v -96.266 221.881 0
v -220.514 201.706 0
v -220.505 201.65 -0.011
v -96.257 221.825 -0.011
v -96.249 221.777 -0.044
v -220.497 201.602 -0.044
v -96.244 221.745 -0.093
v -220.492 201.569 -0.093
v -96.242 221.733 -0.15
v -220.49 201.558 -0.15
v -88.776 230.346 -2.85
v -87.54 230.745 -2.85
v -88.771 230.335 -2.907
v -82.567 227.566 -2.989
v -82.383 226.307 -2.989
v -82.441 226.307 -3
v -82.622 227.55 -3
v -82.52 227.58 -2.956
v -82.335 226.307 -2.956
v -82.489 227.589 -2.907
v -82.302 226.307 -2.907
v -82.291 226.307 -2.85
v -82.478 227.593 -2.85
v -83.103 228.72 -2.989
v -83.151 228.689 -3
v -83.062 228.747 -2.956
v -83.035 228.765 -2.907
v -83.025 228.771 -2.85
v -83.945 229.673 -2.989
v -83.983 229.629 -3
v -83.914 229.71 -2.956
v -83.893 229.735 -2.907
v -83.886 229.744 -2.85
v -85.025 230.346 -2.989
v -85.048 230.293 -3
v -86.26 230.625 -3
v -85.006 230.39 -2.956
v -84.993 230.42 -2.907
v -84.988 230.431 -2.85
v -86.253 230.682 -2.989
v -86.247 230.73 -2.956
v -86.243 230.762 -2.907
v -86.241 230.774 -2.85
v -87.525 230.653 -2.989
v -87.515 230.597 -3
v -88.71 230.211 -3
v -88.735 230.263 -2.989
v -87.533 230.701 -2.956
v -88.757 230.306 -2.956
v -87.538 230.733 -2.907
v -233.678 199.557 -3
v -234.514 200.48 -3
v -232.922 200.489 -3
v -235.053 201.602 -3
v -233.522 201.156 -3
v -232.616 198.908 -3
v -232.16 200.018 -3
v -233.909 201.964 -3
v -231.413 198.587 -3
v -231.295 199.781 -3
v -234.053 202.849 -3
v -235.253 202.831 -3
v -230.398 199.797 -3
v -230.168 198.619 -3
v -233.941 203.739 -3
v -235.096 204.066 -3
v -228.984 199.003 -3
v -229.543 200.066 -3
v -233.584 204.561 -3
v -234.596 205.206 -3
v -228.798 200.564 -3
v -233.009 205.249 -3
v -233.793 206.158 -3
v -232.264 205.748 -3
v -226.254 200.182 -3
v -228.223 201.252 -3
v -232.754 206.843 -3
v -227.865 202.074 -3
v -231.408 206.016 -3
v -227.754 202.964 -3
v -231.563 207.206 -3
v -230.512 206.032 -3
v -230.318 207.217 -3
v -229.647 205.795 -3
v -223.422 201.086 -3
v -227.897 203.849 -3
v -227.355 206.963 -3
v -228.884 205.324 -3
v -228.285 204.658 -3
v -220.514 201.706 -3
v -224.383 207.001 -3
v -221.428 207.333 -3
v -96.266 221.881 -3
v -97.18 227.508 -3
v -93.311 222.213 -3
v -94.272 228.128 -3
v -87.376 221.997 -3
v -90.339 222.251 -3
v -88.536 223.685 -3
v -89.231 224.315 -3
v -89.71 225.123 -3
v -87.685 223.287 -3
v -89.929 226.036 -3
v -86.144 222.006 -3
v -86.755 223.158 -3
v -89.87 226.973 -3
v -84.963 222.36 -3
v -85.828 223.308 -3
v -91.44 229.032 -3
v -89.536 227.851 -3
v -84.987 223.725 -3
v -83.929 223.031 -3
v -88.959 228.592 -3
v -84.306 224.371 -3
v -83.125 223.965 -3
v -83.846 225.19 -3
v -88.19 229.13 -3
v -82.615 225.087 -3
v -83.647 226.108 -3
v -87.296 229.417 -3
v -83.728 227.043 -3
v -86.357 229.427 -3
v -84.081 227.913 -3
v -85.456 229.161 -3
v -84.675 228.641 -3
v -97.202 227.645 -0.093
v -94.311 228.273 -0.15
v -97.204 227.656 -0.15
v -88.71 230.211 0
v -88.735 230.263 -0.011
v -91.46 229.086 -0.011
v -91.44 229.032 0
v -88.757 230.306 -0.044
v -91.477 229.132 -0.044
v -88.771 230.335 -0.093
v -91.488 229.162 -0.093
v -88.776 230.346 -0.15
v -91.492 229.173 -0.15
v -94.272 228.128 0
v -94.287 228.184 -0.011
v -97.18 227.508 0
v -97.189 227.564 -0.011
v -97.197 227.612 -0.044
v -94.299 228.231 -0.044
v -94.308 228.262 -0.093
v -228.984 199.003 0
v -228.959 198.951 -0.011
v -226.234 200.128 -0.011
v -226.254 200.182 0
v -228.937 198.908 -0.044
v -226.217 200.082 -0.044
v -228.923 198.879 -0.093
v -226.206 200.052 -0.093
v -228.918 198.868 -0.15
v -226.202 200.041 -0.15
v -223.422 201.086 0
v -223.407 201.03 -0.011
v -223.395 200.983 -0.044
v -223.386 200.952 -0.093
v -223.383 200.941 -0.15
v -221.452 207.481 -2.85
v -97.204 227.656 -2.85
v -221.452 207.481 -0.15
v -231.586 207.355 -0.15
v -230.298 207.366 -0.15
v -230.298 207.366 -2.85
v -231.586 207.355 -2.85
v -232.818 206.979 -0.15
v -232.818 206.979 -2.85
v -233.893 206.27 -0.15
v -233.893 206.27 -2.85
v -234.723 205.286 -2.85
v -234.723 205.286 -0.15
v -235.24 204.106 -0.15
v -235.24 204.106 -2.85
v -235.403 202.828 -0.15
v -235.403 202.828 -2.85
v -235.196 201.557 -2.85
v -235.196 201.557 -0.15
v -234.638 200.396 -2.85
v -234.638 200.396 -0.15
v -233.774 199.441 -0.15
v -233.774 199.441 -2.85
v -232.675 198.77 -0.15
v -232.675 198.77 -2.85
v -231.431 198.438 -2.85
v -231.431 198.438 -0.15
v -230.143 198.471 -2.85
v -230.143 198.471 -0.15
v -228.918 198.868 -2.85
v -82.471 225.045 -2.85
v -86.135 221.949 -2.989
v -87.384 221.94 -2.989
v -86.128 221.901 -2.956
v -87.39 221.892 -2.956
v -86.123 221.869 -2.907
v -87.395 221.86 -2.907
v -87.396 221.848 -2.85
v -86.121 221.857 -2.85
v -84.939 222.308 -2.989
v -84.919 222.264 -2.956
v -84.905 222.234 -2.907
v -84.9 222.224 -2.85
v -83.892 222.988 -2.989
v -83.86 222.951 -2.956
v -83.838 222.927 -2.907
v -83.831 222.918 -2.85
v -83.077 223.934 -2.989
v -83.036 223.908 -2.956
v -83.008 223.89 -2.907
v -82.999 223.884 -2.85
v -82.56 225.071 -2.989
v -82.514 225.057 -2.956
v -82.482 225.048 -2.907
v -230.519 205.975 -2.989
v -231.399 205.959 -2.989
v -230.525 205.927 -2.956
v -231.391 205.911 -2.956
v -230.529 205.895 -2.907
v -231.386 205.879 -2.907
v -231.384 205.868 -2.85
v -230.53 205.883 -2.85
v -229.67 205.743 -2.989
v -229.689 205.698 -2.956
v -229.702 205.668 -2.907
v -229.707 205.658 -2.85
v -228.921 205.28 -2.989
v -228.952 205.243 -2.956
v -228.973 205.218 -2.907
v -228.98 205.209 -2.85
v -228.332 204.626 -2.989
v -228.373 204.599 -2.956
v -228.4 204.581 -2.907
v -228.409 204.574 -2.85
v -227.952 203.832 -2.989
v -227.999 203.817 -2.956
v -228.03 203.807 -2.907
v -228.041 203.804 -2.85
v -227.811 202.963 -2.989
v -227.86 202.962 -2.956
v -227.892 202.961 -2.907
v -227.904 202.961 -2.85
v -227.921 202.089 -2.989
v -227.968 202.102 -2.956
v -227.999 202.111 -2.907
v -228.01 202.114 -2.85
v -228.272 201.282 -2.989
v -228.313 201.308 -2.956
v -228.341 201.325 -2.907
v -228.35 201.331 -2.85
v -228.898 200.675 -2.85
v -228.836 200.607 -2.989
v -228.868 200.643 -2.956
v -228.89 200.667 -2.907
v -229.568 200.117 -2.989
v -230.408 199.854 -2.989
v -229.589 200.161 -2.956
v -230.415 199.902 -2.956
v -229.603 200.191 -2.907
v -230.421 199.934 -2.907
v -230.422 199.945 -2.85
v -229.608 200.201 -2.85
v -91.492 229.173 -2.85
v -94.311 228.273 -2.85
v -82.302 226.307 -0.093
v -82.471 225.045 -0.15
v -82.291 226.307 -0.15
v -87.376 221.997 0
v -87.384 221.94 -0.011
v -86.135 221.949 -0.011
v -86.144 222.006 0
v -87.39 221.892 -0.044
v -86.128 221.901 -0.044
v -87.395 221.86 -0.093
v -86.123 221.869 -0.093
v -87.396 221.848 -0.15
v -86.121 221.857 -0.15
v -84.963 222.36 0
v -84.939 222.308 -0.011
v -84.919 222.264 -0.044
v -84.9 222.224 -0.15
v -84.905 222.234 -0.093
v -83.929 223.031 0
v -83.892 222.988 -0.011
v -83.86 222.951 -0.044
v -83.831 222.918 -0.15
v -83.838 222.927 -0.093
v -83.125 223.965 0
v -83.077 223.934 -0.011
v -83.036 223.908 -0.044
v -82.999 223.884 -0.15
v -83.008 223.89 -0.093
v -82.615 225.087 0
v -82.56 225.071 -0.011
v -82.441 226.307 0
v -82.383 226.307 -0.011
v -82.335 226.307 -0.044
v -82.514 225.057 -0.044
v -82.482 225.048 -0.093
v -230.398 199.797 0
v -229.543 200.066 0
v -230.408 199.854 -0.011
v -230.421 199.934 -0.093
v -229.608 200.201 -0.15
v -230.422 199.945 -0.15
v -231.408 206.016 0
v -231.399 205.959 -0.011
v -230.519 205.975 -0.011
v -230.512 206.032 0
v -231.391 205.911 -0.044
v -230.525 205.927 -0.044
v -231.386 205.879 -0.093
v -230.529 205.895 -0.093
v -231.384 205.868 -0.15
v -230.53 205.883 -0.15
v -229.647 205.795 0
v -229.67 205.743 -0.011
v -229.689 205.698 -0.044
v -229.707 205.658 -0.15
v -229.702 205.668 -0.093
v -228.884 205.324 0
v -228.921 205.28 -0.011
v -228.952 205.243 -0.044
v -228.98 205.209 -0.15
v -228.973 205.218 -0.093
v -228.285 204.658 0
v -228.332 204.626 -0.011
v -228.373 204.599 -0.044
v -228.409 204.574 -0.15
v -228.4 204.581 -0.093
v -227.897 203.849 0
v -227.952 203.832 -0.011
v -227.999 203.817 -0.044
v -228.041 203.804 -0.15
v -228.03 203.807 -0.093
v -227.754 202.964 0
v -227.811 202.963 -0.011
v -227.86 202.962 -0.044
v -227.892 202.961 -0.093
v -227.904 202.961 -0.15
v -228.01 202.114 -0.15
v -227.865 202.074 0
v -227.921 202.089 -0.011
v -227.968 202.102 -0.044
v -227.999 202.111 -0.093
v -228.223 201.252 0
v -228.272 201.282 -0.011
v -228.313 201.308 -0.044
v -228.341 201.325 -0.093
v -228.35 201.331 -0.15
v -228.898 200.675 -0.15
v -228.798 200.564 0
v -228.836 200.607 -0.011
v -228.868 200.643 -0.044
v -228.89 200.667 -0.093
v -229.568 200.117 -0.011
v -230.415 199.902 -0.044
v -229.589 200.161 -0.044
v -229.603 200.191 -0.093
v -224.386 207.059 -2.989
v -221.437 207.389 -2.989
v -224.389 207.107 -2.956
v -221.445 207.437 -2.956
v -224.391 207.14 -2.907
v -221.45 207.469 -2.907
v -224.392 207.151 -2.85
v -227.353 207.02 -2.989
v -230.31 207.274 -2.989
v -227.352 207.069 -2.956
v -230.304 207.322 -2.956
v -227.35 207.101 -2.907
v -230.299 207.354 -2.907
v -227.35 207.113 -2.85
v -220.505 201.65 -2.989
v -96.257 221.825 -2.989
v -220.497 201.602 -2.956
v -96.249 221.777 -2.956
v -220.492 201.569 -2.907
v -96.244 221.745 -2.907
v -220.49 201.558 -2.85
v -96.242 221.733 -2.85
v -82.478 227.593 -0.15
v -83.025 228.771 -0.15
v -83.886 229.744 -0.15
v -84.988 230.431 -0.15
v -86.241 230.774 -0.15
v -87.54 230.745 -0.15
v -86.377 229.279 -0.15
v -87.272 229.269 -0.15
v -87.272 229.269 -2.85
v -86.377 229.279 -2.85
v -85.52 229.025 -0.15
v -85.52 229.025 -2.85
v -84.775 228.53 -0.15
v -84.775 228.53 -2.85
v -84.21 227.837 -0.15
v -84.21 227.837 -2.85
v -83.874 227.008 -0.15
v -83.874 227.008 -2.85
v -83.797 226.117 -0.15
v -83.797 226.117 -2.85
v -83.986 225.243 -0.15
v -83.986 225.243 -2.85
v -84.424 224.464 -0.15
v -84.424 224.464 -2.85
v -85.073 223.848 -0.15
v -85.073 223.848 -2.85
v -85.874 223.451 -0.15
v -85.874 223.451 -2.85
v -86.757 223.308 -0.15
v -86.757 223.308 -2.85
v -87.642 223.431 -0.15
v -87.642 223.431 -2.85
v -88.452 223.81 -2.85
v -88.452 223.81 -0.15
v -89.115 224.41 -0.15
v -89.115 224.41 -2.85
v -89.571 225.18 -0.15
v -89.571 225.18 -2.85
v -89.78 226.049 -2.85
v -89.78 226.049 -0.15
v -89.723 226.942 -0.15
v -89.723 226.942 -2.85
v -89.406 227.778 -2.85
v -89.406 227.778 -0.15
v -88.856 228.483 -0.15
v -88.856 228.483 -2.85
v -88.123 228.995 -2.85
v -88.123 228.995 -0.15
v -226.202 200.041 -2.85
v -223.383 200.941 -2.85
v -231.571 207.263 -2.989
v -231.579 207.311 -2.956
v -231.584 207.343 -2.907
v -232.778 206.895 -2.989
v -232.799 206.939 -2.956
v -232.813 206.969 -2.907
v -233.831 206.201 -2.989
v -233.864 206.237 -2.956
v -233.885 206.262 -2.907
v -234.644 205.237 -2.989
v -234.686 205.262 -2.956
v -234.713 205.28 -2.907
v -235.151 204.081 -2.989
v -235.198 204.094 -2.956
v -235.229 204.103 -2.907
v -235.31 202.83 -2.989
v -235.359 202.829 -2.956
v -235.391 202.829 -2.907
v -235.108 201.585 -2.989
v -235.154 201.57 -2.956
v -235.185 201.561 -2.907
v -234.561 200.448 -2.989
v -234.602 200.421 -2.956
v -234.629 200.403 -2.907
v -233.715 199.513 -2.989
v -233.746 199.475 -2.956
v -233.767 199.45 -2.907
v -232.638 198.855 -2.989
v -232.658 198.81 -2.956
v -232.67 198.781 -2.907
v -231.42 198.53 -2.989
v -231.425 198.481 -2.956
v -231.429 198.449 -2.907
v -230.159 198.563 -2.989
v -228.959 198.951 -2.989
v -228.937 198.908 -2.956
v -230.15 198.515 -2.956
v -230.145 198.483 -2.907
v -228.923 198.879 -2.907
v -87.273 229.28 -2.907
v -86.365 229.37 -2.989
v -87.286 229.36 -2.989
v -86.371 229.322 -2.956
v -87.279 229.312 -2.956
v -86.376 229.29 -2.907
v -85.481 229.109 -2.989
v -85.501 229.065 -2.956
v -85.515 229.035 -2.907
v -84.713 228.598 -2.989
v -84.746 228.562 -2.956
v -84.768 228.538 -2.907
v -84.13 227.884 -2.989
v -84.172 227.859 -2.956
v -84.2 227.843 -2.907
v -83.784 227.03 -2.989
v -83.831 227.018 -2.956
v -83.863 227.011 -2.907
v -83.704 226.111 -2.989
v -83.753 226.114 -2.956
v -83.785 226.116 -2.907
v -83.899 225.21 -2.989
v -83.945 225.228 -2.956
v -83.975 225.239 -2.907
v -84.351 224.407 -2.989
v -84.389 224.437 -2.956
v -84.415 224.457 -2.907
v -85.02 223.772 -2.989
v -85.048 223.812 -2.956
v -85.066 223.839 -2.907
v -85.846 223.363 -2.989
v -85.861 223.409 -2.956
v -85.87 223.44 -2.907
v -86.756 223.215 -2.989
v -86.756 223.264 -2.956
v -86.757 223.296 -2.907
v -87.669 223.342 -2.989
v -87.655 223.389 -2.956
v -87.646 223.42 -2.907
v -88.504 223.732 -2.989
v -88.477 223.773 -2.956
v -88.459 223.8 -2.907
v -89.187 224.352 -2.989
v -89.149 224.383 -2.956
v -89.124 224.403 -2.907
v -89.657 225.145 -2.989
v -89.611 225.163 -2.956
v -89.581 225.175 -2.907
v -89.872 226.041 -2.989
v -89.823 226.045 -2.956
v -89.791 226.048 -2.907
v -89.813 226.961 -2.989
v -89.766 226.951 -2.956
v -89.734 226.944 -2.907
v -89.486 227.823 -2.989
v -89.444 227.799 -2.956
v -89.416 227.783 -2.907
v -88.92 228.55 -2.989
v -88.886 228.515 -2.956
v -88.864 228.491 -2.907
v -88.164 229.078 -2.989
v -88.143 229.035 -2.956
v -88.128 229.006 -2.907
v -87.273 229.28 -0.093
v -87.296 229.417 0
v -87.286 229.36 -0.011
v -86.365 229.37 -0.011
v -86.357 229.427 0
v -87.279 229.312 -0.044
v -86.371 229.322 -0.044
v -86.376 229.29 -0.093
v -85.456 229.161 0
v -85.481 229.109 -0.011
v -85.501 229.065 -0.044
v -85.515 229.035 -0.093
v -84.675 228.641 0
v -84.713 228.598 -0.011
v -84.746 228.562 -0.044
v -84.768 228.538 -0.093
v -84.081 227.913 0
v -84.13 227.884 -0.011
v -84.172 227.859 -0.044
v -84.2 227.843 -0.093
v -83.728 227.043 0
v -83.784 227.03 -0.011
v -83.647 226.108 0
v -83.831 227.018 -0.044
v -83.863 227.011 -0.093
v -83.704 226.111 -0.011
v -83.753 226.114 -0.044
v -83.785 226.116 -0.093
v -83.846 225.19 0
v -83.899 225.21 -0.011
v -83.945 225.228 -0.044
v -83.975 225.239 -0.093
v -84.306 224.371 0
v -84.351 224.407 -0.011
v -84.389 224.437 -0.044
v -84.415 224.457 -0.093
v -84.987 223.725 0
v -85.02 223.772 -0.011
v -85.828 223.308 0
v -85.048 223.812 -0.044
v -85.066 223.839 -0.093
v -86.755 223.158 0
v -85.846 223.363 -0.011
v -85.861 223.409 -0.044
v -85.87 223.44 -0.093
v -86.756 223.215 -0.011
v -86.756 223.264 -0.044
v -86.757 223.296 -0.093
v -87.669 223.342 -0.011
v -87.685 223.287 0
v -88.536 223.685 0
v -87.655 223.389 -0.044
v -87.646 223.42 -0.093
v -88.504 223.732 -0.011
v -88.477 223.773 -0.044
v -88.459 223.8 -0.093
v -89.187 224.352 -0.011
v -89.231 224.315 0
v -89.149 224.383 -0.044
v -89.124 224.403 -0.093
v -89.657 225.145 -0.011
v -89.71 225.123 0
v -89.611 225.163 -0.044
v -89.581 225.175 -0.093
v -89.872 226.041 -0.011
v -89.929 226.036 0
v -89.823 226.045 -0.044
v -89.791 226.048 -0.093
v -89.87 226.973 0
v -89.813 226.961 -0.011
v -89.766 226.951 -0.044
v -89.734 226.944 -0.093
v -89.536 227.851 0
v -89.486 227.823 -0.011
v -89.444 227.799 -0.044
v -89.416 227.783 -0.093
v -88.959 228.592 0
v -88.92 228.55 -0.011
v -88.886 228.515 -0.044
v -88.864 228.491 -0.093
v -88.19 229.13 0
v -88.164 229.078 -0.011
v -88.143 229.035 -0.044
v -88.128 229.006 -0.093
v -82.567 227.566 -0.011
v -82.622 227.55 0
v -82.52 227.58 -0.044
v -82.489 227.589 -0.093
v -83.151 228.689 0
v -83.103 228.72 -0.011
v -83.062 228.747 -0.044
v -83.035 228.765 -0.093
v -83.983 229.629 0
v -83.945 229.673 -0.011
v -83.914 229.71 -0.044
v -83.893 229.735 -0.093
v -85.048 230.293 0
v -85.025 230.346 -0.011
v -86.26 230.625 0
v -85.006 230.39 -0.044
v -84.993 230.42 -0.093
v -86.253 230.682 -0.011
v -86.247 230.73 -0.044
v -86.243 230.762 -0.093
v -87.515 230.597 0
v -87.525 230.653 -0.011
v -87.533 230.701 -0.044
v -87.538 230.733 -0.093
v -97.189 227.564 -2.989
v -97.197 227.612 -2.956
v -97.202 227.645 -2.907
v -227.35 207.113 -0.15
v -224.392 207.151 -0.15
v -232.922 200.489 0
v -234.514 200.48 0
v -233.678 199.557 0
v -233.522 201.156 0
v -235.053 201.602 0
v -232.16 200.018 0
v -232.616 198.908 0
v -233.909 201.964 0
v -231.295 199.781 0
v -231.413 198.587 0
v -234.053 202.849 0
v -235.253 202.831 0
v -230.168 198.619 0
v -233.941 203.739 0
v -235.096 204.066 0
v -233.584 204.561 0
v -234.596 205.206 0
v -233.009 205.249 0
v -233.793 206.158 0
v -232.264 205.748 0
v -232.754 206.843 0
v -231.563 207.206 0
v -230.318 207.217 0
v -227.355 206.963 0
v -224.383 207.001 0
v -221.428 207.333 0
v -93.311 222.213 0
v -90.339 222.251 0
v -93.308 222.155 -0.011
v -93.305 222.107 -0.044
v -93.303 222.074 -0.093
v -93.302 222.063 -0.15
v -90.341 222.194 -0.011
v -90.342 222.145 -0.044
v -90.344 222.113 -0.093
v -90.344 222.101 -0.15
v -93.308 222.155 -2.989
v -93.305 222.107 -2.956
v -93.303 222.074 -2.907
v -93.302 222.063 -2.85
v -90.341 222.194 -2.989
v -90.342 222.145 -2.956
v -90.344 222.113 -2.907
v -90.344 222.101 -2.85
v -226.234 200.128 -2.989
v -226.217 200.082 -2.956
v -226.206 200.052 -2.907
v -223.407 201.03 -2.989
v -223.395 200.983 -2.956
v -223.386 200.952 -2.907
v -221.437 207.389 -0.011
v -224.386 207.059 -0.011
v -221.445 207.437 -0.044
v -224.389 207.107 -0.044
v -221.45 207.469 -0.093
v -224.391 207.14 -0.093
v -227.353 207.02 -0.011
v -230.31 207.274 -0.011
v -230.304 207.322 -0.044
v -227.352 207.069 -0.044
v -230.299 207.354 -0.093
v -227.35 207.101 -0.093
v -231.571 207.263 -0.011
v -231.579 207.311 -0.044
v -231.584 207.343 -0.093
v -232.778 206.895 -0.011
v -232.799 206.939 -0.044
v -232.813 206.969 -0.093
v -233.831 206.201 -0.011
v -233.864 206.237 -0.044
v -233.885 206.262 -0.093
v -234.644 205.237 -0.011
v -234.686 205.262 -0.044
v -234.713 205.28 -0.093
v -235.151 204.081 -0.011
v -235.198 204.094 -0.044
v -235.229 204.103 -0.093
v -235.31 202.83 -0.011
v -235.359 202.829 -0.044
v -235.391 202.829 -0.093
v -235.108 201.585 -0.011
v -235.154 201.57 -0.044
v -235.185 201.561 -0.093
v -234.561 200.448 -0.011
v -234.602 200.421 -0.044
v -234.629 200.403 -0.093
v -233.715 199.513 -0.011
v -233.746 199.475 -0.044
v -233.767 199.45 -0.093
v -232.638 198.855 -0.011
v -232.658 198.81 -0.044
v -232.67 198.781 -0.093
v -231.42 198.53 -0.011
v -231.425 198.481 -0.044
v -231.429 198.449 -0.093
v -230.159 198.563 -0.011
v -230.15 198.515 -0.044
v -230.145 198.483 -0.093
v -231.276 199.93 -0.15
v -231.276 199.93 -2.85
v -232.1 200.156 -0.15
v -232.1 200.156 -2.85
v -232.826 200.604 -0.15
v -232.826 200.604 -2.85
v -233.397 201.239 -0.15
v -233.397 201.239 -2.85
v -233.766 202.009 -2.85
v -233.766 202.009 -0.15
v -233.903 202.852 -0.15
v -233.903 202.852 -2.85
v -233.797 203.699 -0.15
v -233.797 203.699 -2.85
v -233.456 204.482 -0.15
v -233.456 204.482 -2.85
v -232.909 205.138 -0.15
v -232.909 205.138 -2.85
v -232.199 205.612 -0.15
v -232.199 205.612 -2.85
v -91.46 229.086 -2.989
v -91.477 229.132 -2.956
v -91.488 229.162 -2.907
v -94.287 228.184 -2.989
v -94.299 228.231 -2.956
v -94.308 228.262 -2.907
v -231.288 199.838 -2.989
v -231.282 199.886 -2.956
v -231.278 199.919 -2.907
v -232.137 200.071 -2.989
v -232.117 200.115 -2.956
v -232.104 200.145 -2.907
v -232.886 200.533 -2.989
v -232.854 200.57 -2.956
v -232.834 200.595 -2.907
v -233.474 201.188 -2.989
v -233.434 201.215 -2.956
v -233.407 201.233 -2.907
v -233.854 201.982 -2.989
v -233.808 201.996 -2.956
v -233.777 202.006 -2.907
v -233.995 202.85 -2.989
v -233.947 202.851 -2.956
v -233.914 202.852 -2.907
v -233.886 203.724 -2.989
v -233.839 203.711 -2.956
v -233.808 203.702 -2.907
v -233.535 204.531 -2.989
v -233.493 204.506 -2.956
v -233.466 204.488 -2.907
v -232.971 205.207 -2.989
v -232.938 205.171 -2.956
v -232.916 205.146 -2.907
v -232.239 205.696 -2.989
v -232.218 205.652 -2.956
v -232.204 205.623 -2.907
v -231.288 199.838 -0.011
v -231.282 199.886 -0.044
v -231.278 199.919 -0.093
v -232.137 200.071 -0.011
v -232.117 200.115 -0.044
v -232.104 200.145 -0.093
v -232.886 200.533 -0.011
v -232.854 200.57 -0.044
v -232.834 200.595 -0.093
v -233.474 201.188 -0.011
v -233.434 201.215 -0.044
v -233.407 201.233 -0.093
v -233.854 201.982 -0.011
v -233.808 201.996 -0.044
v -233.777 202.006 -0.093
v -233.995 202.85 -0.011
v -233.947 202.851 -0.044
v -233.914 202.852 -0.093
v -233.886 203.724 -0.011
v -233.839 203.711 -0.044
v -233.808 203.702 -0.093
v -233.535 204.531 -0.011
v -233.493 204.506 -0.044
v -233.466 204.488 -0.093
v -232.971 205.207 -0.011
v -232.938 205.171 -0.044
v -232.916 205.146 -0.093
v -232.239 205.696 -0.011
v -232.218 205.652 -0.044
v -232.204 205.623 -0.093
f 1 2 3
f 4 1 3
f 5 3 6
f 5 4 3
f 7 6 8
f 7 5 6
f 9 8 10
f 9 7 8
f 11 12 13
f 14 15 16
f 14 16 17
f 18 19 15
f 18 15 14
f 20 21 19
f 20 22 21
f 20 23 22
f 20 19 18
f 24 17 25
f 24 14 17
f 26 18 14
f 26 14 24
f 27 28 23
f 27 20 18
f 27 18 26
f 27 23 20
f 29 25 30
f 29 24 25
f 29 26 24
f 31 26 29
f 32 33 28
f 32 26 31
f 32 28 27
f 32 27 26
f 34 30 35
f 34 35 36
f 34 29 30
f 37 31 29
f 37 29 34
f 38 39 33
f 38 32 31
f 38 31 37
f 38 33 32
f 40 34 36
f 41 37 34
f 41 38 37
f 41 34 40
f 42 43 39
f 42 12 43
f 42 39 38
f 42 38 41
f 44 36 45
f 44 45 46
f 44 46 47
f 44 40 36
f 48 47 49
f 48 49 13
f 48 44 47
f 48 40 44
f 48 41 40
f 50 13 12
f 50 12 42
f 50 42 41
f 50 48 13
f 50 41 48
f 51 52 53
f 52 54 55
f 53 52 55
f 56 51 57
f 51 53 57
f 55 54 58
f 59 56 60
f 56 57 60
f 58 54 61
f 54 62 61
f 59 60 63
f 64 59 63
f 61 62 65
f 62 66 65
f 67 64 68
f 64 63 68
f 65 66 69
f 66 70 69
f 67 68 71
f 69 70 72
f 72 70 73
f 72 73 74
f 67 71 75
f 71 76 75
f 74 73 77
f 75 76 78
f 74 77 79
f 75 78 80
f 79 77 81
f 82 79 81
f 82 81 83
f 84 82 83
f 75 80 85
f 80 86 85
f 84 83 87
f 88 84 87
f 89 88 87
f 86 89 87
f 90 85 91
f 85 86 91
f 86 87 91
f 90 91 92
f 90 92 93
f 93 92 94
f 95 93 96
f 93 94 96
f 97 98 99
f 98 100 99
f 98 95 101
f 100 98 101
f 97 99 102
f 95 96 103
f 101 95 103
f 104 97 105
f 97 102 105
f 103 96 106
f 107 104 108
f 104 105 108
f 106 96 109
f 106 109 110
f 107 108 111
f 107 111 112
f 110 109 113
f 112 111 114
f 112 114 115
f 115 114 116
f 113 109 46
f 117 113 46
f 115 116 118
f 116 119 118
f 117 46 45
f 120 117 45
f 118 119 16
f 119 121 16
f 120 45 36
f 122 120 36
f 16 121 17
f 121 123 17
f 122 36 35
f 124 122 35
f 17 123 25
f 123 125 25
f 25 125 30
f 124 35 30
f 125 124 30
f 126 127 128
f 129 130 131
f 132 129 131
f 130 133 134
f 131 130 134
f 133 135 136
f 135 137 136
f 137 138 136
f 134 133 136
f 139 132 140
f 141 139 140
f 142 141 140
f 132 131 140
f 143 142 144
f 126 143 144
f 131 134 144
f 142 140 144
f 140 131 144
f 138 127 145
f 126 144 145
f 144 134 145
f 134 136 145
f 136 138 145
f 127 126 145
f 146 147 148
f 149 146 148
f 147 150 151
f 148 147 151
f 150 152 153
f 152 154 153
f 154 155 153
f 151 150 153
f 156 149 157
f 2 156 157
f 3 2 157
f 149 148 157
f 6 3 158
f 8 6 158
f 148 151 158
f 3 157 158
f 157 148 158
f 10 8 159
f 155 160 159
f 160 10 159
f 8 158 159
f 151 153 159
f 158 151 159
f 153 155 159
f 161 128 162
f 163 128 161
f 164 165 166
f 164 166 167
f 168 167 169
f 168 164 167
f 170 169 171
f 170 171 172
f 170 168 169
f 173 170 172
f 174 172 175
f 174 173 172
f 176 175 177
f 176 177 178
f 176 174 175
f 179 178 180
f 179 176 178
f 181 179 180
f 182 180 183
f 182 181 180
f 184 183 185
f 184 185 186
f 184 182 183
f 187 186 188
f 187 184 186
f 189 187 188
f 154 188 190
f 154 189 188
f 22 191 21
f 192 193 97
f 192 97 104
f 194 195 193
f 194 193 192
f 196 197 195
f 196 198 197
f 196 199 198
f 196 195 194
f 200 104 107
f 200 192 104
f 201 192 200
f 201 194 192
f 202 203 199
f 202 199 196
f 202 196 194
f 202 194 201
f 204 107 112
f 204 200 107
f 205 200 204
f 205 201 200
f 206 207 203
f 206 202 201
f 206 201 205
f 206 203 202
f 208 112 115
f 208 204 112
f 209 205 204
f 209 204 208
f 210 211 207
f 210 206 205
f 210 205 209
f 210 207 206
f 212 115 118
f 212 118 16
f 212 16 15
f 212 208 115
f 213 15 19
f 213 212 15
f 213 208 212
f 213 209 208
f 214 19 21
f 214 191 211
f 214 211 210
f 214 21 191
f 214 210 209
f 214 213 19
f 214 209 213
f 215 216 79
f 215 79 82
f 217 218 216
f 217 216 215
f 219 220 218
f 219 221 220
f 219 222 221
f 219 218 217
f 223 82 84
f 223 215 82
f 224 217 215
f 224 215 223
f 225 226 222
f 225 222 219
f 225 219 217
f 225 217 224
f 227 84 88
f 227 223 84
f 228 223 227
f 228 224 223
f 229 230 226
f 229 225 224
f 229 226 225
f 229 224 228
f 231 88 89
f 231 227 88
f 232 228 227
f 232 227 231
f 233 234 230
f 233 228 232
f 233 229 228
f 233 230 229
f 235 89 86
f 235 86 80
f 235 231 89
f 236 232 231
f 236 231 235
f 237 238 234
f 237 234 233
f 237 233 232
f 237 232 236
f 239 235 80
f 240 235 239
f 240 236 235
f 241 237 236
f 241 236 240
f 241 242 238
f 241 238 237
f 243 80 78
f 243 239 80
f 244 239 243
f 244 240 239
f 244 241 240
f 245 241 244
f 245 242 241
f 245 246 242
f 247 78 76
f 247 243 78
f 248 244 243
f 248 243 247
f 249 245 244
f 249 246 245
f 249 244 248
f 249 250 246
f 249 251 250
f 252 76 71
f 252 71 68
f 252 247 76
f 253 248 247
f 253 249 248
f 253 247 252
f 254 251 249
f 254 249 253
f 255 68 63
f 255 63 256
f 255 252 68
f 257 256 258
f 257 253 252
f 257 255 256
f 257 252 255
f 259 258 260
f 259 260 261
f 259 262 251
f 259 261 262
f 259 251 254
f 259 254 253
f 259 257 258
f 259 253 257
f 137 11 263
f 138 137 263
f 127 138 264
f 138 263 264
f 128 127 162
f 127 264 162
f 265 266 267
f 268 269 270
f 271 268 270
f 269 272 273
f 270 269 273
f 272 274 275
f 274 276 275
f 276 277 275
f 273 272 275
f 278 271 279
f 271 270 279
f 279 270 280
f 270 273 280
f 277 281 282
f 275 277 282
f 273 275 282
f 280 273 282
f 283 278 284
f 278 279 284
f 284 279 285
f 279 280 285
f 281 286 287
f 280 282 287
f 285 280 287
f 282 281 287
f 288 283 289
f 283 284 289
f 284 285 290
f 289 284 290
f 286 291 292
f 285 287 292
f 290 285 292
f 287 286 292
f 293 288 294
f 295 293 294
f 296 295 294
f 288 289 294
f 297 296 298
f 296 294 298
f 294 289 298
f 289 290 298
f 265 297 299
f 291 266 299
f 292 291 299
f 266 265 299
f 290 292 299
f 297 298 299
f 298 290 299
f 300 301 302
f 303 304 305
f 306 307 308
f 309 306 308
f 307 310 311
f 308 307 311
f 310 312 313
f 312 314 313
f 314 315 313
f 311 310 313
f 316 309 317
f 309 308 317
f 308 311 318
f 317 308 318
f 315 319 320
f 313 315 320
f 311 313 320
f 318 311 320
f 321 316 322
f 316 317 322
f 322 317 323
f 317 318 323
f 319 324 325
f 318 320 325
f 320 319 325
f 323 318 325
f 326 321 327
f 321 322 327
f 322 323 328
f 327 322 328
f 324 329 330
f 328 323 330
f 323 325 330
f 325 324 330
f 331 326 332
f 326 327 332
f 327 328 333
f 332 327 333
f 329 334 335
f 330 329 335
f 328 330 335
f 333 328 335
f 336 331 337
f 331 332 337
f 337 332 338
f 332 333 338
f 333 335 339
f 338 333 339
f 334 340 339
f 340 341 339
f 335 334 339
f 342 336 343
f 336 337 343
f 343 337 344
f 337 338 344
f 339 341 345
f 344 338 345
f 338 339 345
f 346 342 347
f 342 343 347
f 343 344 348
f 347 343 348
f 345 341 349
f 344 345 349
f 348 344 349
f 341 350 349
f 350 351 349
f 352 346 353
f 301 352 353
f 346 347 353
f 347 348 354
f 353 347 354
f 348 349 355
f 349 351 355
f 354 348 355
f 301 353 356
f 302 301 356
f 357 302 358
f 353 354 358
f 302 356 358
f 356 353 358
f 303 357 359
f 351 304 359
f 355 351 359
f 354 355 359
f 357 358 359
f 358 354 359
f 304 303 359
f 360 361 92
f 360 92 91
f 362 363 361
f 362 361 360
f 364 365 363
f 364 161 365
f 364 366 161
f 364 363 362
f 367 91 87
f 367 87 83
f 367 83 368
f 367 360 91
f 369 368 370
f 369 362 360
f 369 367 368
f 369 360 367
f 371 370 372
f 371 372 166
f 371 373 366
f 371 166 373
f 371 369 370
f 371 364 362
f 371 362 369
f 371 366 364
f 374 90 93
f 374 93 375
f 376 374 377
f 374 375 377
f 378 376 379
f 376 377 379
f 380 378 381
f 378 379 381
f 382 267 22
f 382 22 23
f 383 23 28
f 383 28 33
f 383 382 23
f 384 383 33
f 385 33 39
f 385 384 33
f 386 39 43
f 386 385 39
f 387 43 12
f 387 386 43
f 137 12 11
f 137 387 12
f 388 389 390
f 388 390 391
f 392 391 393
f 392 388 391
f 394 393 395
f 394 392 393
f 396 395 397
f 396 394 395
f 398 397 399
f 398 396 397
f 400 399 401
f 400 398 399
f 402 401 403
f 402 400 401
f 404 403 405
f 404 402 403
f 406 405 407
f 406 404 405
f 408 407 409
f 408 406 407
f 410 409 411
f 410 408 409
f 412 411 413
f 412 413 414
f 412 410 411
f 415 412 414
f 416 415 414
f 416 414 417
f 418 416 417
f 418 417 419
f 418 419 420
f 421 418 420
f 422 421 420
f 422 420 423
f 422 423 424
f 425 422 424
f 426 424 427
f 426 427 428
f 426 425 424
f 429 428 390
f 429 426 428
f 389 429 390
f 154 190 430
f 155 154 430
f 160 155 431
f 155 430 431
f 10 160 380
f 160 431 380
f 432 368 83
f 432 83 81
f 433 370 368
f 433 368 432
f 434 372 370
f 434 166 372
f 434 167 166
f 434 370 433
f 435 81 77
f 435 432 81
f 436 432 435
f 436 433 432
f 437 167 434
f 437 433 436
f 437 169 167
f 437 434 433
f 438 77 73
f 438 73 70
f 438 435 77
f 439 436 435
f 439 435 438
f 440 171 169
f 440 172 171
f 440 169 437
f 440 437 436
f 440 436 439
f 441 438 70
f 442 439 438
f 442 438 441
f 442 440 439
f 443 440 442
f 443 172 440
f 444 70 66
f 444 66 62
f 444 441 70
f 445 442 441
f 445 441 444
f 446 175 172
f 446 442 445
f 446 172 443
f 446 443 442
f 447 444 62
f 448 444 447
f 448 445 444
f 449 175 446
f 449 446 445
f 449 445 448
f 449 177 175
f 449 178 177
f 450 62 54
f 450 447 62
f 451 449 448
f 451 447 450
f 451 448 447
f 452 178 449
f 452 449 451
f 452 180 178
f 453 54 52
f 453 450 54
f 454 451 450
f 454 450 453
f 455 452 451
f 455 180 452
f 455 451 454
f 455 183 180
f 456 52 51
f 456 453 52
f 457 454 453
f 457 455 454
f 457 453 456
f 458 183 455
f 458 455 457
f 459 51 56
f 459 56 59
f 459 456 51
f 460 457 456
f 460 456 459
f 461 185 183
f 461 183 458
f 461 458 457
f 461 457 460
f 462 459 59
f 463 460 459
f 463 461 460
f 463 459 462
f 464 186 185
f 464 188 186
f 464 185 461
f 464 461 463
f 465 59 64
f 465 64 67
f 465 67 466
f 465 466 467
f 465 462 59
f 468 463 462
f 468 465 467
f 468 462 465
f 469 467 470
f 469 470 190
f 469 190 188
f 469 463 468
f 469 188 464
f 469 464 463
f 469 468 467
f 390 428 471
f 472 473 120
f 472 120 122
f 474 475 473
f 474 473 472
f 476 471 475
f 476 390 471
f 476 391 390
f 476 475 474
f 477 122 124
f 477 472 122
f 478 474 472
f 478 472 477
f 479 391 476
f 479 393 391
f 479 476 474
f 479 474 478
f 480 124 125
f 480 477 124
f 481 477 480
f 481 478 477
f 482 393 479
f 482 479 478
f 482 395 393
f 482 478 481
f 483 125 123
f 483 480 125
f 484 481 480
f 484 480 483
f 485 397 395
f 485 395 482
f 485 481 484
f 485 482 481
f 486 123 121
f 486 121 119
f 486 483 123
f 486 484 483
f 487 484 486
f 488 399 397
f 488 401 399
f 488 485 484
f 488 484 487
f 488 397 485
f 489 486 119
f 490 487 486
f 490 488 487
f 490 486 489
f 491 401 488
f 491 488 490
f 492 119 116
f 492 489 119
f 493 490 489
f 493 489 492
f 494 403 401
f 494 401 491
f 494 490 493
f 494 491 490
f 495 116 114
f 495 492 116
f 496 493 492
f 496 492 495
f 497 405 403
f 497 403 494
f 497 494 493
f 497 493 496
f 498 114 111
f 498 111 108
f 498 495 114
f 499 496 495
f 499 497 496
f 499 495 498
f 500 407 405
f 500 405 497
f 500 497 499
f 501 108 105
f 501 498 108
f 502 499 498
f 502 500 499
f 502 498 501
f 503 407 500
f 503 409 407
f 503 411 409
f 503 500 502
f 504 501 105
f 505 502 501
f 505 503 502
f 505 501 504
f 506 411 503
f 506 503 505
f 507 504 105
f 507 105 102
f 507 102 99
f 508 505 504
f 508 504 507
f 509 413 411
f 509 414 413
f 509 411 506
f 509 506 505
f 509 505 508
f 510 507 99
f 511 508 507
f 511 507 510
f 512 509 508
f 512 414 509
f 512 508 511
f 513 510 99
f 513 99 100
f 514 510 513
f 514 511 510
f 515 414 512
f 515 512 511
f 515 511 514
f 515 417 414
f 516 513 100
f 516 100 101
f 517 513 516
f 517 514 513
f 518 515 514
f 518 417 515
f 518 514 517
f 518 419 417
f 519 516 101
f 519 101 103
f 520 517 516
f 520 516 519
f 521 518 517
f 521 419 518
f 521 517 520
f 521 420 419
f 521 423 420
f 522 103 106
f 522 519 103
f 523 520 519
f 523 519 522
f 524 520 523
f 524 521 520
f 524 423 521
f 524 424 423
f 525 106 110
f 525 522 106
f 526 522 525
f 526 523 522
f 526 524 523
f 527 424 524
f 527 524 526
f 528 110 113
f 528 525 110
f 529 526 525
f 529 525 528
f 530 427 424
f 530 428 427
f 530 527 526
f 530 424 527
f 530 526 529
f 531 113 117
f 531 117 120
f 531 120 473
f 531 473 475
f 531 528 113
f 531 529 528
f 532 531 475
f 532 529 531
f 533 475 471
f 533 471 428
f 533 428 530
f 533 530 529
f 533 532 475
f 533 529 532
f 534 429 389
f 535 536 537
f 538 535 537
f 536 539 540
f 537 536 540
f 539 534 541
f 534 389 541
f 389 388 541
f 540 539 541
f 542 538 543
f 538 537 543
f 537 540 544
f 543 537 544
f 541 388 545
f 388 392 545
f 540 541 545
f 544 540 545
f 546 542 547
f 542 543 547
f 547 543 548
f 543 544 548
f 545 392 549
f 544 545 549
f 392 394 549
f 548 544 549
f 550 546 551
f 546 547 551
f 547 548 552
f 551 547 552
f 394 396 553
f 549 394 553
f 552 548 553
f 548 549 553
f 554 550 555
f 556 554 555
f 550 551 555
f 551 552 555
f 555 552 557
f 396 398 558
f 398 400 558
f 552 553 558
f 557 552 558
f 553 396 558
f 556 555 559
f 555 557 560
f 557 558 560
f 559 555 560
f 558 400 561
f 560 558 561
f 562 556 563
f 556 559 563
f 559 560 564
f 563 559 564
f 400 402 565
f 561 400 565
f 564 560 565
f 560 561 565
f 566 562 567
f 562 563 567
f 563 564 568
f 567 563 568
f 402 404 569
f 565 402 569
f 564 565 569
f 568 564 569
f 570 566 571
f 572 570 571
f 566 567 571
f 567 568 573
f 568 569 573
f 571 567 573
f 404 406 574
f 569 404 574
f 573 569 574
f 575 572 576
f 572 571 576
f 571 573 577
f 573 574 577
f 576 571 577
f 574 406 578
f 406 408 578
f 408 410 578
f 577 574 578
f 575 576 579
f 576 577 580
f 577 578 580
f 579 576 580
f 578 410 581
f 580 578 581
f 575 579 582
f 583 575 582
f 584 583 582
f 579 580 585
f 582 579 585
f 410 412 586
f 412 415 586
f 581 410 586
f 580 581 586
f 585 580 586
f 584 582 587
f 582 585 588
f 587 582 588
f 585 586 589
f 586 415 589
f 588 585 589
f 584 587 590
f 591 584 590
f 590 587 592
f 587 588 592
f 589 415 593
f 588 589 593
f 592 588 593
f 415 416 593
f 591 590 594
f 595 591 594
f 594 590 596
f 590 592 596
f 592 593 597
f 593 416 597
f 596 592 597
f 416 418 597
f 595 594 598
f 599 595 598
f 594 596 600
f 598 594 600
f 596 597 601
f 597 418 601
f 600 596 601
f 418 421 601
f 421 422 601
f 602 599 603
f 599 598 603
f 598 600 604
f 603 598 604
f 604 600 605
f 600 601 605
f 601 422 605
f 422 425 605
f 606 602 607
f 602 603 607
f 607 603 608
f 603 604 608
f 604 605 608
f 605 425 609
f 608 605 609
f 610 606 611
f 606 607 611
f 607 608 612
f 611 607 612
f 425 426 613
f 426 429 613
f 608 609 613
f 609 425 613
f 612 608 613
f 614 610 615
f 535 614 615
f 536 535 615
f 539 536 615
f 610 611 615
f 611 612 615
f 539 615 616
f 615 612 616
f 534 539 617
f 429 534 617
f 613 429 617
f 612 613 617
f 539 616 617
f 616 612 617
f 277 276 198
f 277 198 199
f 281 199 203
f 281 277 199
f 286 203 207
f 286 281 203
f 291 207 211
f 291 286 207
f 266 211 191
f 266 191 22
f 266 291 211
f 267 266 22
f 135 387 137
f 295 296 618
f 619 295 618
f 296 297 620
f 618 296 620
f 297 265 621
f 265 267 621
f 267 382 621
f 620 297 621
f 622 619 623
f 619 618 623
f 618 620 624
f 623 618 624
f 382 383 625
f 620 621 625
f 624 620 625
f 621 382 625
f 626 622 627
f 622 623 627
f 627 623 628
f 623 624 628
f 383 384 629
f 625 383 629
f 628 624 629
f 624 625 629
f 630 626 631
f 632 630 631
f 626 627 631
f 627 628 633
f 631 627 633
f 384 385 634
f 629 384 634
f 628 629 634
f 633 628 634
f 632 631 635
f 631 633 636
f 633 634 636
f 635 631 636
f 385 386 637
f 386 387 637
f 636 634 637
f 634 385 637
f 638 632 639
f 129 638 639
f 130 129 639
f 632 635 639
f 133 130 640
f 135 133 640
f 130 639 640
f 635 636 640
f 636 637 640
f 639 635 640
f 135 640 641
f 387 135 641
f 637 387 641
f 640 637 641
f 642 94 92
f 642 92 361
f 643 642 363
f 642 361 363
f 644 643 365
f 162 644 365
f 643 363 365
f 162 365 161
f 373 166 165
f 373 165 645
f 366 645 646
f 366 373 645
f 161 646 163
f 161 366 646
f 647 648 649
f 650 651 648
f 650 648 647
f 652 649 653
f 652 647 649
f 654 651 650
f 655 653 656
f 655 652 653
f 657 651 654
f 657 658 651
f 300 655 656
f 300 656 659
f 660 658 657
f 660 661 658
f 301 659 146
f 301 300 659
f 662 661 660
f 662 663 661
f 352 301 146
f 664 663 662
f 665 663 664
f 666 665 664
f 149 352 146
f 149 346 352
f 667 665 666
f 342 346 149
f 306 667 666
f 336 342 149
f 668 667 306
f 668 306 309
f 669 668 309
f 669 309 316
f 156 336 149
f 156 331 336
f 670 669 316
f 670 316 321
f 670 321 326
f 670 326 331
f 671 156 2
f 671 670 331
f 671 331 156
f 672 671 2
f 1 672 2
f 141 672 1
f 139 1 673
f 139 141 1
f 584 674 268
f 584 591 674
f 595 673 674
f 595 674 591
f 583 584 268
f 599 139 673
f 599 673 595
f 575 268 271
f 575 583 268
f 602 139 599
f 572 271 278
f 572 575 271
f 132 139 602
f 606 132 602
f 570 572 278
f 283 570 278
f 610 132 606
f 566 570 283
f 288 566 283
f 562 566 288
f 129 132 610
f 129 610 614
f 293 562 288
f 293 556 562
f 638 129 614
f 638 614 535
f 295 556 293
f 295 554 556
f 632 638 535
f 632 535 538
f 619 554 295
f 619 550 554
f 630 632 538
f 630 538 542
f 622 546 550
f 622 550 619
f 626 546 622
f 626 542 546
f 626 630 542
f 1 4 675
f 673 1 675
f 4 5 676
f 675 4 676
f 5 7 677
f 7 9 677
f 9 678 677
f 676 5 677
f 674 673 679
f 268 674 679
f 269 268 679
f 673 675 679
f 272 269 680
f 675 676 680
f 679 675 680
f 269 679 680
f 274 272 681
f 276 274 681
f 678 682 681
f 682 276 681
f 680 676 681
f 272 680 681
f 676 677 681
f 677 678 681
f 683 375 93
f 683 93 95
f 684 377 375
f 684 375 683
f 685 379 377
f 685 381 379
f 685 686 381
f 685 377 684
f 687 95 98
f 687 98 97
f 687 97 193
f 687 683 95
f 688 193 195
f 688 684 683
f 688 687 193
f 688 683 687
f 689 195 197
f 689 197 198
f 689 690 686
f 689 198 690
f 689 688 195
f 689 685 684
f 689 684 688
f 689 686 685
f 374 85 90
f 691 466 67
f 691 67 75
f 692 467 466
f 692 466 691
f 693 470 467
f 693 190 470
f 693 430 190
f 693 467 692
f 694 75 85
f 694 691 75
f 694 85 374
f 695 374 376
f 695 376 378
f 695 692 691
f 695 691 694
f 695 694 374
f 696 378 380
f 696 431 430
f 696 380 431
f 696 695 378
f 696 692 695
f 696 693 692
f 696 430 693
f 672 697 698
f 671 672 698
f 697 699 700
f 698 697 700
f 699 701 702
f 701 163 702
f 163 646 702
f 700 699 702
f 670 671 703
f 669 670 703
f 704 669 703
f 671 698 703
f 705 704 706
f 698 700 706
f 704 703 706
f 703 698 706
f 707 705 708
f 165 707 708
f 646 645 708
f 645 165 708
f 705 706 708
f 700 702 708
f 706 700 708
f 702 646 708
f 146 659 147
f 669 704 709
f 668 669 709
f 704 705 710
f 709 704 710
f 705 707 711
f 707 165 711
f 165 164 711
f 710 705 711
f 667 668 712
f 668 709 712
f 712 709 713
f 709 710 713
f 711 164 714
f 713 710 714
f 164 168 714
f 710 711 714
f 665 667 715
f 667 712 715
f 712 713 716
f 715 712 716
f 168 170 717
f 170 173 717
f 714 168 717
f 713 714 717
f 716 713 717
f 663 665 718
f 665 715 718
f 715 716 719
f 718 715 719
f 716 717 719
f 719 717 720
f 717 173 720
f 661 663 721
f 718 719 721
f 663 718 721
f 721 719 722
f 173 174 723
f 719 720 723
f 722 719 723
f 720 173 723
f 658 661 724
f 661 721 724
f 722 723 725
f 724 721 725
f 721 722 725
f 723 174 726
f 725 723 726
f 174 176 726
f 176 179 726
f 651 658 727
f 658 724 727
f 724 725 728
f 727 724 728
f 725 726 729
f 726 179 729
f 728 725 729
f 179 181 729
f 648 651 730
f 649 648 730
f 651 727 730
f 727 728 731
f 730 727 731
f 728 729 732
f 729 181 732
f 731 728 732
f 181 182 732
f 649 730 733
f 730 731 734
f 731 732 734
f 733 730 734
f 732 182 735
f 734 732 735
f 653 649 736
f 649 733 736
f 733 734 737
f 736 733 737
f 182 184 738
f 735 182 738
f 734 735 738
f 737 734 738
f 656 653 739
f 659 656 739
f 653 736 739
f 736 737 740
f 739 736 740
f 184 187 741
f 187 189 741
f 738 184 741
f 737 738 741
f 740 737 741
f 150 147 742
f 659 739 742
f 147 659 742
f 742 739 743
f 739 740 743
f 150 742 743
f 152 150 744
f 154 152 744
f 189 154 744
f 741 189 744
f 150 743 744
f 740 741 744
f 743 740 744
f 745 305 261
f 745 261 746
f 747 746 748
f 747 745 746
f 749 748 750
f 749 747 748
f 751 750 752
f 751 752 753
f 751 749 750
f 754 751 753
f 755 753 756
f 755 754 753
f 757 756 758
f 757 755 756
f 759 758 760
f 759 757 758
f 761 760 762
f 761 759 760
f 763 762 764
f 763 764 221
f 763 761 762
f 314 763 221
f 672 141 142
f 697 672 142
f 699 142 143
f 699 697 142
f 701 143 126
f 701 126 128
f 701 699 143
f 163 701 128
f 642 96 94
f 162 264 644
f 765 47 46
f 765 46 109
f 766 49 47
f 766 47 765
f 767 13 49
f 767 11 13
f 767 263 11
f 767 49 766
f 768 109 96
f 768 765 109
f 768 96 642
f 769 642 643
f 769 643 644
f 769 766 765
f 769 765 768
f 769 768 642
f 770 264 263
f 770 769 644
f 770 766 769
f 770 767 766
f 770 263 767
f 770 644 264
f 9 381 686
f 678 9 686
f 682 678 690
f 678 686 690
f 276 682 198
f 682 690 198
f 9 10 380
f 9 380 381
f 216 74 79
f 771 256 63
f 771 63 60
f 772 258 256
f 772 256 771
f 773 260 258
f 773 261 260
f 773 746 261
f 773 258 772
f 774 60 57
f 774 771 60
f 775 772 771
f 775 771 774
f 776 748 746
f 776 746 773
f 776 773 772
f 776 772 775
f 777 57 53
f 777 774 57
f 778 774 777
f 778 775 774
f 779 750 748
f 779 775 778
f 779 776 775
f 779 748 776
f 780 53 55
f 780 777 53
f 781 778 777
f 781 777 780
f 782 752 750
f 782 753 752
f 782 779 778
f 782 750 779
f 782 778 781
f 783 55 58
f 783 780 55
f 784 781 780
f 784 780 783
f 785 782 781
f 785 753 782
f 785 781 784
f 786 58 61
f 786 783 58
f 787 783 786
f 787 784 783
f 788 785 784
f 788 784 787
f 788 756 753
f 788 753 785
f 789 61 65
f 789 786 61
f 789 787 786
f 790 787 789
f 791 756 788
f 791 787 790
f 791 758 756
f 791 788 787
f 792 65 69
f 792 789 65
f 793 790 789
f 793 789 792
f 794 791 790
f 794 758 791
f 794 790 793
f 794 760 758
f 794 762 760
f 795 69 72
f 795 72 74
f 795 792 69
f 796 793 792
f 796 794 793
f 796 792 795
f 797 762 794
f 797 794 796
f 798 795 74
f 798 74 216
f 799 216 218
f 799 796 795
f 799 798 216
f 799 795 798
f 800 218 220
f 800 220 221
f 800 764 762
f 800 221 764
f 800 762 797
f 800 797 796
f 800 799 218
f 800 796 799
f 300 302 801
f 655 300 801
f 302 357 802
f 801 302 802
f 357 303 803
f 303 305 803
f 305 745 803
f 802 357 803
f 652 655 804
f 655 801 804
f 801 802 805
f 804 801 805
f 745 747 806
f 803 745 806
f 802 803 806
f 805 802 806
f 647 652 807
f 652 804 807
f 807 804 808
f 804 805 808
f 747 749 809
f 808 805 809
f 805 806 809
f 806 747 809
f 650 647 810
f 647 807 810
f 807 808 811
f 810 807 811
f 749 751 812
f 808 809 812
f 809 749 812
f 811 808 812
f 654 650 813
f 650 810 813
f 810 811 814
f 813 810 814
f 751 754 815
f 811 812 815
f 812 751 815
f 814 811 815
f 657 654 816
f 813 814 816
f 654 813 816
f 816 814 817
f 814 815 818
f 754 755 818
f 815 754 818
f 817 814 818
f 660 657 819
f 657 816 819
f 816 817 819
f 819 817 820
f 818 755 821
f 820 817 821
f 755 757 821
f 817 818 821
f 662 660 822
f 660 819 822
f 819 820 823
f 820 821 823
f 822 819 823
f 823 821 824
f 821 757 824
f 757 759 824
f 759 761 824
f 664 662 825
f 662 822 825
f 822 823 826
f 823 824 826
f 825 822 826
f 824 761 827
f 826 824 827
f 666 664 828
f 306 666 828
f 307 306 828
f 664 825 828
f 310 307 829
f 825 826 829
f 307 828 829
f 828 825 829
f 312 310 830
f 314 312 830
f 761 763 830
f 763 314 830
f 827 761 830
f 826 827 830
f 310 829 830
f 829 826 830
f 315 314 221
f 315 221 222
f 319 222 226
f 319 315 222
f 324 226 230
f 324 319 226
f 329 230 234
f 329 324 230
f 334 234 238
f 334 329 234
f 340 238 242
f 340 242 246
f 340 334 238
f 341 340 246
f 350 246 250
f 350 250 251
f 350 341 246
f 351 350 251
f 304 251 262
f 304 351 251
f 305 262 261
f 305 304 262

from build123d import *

# Parameters (mm, degrees)
BOSS_EXTRUDE1_DEPTH = 3
FILLET1_R           = 30
FILLET2_R           = 0.15


with BuildPart() as part:
    # Sketch1 → Boss-Extrude1 (new body)
    with BuildSketch(Plane.XY):
        with BuildLine():
            ThreePointArc((-230.422405518, 199.945444308), (-233.864456933, 202.425823726), (-231.384077516, 205.867875141))
            Line((-231.384077516, 205.867875141), (-228.073338032, 206.405466131))
            ThreePointArc((-228.073338032, 206.405466131), (-235.345064641, 202.185405726), (-227.111666035, 200.483035298))
            Line((-227.111666035, 200.483035298), (-230.422405518, 199.945444308))
        make_face()
        with BuildLine():
            Line((-228.073338032, 206.405466131), (-231.384077516, 205.867875141))
            ThreePointArc((-231.384077516, 205.867875141), (-227.942026101, 203.387495723), (-230.422405518, 199.945444308))
            Line((-230.422405518, 199.945444308), (-227.111666035, 200.483035298))
            ThreePointArc((-227.111666035, 200.483035298), (-226.583977131, 201.644140352), (-226.403241517, 202.906659725))
            ThreePointArc((-226.403241517, 202.906659725), (-226.842172342, 204.845142936), (-228.073338032, 206.405466131))
        make_face()
        with BuildLine():
            Line((-90.582333401, 228.730969425), (-228.073338032, 206.405466131))
            ThreePointArc((-228.073338032, 206.405466131), (-226.842172342, 204.845142936), (-226.403241517, 202.906659725))
            ThreePointArc((-226.403241517, 202.906659725), (-226.583977131, 201.644140352), (-227.111666035, 200.483035298))
            Line((-227.111666035, 200.483035298), (-89.620661404, 222.808538592))
            ThreePointArc((-89.620661404, 222.808538592), (-91.232581044, 225.586091), (-90.582333401, 228.730969425))
        make_face()
        with BuildLine():
            Line((-87.271593918, 229.268560415), (-90.582333401, 228.730969425))
            ThreePointArc((-90.582333401, 228.730969425), (-91.232581044, 225.586091), (-89.620661404, 222.808538592))
            Line((-89.620661404, 222.808538592), (-86.30992192, 223.346129582))
            ThreePointArc((-86.30992192, 223.346129582), (-89.751973336, 225.826508999), (-87.271593918, 229.268560415))
        make_face()
        with BuildLine():
            ThreePointArc((-82.290757919, 226.307344998), (-85.528238547, 230.626609384), (-90.582333401, 228.730969425))
            Line((-90.582333401, 228.730969425), (-87.271593918, 229.268560415))
            ThreePointArc((-87.271593918, 229.268560415), (-83.829542503, 226.788180997), (-86.30992192, 223.346129582))
            Line((-86.30992192, 223.346129582), (-89.620661404, 222.808538592))
            ThreePointArc((-89.620661404, 222.808538592), (-84.852274708, 222.246275824), (-82.290757919, 226.307344998))
        make_face()
    extrude(amount=-BOSS_EXTRUDE1_DEPTH)

    # Fillet1
    fillet1_edges = [part.edges().sort_by_distance(p)[0] for p in [
        (-228.073338032, 206.405466131, -1.5),
        (-90.582333401, 228.730969425, -1.5),
        (-89.620661404, 222.808538592, -1.5),
        (-227.111666035, 200.483035298, -1.5),
    ]]
    fillet(fillet1_edges, radius=FILLET1_R)

    # Fillet2
    fillet2_edges = [part.edges().sort_by_distance(p)[0] for p in [
        (-87.271593918, 229.268560415, 0),
        (-82.348934795, 227.028598996, 0),
        (-82.348934795, 227.028598996, -3),
        (-159.327835717, 217.568217778, 0),
        (-159.327835717, 217.568217778, -3),
        (-158.366163719, 211.645786945, 0),
        (-158.366163719, 211.645786945, -3),
        (-235.345064641, 202.185405726, 0),
        (-235.345064641, 202.185405726, -3),
        (-92.890290393, 228.688381266, 0),
        (-92.890290393, 228.688381266, -3),
        (-91.823514475, 222.118670798, 0),
        (-230.422405518, 199.945444308, -3),
        (-91.823514475, 222.118670798, -3),
        (-224.803709043, 200.525623457, 0),
        (-224.803709043, 200.525623457, -3),
        (-225.870484961, 207.095333925, 0),
        (-225.870484961, 207.095333925, -3),
        (-87.271593918, 229.268560415, -3),
        (-230.422405518, 199.945444308, 0),
    ]]
    fillet(fillet2_edges, radius=FILLET2_R)


solid = part.part
